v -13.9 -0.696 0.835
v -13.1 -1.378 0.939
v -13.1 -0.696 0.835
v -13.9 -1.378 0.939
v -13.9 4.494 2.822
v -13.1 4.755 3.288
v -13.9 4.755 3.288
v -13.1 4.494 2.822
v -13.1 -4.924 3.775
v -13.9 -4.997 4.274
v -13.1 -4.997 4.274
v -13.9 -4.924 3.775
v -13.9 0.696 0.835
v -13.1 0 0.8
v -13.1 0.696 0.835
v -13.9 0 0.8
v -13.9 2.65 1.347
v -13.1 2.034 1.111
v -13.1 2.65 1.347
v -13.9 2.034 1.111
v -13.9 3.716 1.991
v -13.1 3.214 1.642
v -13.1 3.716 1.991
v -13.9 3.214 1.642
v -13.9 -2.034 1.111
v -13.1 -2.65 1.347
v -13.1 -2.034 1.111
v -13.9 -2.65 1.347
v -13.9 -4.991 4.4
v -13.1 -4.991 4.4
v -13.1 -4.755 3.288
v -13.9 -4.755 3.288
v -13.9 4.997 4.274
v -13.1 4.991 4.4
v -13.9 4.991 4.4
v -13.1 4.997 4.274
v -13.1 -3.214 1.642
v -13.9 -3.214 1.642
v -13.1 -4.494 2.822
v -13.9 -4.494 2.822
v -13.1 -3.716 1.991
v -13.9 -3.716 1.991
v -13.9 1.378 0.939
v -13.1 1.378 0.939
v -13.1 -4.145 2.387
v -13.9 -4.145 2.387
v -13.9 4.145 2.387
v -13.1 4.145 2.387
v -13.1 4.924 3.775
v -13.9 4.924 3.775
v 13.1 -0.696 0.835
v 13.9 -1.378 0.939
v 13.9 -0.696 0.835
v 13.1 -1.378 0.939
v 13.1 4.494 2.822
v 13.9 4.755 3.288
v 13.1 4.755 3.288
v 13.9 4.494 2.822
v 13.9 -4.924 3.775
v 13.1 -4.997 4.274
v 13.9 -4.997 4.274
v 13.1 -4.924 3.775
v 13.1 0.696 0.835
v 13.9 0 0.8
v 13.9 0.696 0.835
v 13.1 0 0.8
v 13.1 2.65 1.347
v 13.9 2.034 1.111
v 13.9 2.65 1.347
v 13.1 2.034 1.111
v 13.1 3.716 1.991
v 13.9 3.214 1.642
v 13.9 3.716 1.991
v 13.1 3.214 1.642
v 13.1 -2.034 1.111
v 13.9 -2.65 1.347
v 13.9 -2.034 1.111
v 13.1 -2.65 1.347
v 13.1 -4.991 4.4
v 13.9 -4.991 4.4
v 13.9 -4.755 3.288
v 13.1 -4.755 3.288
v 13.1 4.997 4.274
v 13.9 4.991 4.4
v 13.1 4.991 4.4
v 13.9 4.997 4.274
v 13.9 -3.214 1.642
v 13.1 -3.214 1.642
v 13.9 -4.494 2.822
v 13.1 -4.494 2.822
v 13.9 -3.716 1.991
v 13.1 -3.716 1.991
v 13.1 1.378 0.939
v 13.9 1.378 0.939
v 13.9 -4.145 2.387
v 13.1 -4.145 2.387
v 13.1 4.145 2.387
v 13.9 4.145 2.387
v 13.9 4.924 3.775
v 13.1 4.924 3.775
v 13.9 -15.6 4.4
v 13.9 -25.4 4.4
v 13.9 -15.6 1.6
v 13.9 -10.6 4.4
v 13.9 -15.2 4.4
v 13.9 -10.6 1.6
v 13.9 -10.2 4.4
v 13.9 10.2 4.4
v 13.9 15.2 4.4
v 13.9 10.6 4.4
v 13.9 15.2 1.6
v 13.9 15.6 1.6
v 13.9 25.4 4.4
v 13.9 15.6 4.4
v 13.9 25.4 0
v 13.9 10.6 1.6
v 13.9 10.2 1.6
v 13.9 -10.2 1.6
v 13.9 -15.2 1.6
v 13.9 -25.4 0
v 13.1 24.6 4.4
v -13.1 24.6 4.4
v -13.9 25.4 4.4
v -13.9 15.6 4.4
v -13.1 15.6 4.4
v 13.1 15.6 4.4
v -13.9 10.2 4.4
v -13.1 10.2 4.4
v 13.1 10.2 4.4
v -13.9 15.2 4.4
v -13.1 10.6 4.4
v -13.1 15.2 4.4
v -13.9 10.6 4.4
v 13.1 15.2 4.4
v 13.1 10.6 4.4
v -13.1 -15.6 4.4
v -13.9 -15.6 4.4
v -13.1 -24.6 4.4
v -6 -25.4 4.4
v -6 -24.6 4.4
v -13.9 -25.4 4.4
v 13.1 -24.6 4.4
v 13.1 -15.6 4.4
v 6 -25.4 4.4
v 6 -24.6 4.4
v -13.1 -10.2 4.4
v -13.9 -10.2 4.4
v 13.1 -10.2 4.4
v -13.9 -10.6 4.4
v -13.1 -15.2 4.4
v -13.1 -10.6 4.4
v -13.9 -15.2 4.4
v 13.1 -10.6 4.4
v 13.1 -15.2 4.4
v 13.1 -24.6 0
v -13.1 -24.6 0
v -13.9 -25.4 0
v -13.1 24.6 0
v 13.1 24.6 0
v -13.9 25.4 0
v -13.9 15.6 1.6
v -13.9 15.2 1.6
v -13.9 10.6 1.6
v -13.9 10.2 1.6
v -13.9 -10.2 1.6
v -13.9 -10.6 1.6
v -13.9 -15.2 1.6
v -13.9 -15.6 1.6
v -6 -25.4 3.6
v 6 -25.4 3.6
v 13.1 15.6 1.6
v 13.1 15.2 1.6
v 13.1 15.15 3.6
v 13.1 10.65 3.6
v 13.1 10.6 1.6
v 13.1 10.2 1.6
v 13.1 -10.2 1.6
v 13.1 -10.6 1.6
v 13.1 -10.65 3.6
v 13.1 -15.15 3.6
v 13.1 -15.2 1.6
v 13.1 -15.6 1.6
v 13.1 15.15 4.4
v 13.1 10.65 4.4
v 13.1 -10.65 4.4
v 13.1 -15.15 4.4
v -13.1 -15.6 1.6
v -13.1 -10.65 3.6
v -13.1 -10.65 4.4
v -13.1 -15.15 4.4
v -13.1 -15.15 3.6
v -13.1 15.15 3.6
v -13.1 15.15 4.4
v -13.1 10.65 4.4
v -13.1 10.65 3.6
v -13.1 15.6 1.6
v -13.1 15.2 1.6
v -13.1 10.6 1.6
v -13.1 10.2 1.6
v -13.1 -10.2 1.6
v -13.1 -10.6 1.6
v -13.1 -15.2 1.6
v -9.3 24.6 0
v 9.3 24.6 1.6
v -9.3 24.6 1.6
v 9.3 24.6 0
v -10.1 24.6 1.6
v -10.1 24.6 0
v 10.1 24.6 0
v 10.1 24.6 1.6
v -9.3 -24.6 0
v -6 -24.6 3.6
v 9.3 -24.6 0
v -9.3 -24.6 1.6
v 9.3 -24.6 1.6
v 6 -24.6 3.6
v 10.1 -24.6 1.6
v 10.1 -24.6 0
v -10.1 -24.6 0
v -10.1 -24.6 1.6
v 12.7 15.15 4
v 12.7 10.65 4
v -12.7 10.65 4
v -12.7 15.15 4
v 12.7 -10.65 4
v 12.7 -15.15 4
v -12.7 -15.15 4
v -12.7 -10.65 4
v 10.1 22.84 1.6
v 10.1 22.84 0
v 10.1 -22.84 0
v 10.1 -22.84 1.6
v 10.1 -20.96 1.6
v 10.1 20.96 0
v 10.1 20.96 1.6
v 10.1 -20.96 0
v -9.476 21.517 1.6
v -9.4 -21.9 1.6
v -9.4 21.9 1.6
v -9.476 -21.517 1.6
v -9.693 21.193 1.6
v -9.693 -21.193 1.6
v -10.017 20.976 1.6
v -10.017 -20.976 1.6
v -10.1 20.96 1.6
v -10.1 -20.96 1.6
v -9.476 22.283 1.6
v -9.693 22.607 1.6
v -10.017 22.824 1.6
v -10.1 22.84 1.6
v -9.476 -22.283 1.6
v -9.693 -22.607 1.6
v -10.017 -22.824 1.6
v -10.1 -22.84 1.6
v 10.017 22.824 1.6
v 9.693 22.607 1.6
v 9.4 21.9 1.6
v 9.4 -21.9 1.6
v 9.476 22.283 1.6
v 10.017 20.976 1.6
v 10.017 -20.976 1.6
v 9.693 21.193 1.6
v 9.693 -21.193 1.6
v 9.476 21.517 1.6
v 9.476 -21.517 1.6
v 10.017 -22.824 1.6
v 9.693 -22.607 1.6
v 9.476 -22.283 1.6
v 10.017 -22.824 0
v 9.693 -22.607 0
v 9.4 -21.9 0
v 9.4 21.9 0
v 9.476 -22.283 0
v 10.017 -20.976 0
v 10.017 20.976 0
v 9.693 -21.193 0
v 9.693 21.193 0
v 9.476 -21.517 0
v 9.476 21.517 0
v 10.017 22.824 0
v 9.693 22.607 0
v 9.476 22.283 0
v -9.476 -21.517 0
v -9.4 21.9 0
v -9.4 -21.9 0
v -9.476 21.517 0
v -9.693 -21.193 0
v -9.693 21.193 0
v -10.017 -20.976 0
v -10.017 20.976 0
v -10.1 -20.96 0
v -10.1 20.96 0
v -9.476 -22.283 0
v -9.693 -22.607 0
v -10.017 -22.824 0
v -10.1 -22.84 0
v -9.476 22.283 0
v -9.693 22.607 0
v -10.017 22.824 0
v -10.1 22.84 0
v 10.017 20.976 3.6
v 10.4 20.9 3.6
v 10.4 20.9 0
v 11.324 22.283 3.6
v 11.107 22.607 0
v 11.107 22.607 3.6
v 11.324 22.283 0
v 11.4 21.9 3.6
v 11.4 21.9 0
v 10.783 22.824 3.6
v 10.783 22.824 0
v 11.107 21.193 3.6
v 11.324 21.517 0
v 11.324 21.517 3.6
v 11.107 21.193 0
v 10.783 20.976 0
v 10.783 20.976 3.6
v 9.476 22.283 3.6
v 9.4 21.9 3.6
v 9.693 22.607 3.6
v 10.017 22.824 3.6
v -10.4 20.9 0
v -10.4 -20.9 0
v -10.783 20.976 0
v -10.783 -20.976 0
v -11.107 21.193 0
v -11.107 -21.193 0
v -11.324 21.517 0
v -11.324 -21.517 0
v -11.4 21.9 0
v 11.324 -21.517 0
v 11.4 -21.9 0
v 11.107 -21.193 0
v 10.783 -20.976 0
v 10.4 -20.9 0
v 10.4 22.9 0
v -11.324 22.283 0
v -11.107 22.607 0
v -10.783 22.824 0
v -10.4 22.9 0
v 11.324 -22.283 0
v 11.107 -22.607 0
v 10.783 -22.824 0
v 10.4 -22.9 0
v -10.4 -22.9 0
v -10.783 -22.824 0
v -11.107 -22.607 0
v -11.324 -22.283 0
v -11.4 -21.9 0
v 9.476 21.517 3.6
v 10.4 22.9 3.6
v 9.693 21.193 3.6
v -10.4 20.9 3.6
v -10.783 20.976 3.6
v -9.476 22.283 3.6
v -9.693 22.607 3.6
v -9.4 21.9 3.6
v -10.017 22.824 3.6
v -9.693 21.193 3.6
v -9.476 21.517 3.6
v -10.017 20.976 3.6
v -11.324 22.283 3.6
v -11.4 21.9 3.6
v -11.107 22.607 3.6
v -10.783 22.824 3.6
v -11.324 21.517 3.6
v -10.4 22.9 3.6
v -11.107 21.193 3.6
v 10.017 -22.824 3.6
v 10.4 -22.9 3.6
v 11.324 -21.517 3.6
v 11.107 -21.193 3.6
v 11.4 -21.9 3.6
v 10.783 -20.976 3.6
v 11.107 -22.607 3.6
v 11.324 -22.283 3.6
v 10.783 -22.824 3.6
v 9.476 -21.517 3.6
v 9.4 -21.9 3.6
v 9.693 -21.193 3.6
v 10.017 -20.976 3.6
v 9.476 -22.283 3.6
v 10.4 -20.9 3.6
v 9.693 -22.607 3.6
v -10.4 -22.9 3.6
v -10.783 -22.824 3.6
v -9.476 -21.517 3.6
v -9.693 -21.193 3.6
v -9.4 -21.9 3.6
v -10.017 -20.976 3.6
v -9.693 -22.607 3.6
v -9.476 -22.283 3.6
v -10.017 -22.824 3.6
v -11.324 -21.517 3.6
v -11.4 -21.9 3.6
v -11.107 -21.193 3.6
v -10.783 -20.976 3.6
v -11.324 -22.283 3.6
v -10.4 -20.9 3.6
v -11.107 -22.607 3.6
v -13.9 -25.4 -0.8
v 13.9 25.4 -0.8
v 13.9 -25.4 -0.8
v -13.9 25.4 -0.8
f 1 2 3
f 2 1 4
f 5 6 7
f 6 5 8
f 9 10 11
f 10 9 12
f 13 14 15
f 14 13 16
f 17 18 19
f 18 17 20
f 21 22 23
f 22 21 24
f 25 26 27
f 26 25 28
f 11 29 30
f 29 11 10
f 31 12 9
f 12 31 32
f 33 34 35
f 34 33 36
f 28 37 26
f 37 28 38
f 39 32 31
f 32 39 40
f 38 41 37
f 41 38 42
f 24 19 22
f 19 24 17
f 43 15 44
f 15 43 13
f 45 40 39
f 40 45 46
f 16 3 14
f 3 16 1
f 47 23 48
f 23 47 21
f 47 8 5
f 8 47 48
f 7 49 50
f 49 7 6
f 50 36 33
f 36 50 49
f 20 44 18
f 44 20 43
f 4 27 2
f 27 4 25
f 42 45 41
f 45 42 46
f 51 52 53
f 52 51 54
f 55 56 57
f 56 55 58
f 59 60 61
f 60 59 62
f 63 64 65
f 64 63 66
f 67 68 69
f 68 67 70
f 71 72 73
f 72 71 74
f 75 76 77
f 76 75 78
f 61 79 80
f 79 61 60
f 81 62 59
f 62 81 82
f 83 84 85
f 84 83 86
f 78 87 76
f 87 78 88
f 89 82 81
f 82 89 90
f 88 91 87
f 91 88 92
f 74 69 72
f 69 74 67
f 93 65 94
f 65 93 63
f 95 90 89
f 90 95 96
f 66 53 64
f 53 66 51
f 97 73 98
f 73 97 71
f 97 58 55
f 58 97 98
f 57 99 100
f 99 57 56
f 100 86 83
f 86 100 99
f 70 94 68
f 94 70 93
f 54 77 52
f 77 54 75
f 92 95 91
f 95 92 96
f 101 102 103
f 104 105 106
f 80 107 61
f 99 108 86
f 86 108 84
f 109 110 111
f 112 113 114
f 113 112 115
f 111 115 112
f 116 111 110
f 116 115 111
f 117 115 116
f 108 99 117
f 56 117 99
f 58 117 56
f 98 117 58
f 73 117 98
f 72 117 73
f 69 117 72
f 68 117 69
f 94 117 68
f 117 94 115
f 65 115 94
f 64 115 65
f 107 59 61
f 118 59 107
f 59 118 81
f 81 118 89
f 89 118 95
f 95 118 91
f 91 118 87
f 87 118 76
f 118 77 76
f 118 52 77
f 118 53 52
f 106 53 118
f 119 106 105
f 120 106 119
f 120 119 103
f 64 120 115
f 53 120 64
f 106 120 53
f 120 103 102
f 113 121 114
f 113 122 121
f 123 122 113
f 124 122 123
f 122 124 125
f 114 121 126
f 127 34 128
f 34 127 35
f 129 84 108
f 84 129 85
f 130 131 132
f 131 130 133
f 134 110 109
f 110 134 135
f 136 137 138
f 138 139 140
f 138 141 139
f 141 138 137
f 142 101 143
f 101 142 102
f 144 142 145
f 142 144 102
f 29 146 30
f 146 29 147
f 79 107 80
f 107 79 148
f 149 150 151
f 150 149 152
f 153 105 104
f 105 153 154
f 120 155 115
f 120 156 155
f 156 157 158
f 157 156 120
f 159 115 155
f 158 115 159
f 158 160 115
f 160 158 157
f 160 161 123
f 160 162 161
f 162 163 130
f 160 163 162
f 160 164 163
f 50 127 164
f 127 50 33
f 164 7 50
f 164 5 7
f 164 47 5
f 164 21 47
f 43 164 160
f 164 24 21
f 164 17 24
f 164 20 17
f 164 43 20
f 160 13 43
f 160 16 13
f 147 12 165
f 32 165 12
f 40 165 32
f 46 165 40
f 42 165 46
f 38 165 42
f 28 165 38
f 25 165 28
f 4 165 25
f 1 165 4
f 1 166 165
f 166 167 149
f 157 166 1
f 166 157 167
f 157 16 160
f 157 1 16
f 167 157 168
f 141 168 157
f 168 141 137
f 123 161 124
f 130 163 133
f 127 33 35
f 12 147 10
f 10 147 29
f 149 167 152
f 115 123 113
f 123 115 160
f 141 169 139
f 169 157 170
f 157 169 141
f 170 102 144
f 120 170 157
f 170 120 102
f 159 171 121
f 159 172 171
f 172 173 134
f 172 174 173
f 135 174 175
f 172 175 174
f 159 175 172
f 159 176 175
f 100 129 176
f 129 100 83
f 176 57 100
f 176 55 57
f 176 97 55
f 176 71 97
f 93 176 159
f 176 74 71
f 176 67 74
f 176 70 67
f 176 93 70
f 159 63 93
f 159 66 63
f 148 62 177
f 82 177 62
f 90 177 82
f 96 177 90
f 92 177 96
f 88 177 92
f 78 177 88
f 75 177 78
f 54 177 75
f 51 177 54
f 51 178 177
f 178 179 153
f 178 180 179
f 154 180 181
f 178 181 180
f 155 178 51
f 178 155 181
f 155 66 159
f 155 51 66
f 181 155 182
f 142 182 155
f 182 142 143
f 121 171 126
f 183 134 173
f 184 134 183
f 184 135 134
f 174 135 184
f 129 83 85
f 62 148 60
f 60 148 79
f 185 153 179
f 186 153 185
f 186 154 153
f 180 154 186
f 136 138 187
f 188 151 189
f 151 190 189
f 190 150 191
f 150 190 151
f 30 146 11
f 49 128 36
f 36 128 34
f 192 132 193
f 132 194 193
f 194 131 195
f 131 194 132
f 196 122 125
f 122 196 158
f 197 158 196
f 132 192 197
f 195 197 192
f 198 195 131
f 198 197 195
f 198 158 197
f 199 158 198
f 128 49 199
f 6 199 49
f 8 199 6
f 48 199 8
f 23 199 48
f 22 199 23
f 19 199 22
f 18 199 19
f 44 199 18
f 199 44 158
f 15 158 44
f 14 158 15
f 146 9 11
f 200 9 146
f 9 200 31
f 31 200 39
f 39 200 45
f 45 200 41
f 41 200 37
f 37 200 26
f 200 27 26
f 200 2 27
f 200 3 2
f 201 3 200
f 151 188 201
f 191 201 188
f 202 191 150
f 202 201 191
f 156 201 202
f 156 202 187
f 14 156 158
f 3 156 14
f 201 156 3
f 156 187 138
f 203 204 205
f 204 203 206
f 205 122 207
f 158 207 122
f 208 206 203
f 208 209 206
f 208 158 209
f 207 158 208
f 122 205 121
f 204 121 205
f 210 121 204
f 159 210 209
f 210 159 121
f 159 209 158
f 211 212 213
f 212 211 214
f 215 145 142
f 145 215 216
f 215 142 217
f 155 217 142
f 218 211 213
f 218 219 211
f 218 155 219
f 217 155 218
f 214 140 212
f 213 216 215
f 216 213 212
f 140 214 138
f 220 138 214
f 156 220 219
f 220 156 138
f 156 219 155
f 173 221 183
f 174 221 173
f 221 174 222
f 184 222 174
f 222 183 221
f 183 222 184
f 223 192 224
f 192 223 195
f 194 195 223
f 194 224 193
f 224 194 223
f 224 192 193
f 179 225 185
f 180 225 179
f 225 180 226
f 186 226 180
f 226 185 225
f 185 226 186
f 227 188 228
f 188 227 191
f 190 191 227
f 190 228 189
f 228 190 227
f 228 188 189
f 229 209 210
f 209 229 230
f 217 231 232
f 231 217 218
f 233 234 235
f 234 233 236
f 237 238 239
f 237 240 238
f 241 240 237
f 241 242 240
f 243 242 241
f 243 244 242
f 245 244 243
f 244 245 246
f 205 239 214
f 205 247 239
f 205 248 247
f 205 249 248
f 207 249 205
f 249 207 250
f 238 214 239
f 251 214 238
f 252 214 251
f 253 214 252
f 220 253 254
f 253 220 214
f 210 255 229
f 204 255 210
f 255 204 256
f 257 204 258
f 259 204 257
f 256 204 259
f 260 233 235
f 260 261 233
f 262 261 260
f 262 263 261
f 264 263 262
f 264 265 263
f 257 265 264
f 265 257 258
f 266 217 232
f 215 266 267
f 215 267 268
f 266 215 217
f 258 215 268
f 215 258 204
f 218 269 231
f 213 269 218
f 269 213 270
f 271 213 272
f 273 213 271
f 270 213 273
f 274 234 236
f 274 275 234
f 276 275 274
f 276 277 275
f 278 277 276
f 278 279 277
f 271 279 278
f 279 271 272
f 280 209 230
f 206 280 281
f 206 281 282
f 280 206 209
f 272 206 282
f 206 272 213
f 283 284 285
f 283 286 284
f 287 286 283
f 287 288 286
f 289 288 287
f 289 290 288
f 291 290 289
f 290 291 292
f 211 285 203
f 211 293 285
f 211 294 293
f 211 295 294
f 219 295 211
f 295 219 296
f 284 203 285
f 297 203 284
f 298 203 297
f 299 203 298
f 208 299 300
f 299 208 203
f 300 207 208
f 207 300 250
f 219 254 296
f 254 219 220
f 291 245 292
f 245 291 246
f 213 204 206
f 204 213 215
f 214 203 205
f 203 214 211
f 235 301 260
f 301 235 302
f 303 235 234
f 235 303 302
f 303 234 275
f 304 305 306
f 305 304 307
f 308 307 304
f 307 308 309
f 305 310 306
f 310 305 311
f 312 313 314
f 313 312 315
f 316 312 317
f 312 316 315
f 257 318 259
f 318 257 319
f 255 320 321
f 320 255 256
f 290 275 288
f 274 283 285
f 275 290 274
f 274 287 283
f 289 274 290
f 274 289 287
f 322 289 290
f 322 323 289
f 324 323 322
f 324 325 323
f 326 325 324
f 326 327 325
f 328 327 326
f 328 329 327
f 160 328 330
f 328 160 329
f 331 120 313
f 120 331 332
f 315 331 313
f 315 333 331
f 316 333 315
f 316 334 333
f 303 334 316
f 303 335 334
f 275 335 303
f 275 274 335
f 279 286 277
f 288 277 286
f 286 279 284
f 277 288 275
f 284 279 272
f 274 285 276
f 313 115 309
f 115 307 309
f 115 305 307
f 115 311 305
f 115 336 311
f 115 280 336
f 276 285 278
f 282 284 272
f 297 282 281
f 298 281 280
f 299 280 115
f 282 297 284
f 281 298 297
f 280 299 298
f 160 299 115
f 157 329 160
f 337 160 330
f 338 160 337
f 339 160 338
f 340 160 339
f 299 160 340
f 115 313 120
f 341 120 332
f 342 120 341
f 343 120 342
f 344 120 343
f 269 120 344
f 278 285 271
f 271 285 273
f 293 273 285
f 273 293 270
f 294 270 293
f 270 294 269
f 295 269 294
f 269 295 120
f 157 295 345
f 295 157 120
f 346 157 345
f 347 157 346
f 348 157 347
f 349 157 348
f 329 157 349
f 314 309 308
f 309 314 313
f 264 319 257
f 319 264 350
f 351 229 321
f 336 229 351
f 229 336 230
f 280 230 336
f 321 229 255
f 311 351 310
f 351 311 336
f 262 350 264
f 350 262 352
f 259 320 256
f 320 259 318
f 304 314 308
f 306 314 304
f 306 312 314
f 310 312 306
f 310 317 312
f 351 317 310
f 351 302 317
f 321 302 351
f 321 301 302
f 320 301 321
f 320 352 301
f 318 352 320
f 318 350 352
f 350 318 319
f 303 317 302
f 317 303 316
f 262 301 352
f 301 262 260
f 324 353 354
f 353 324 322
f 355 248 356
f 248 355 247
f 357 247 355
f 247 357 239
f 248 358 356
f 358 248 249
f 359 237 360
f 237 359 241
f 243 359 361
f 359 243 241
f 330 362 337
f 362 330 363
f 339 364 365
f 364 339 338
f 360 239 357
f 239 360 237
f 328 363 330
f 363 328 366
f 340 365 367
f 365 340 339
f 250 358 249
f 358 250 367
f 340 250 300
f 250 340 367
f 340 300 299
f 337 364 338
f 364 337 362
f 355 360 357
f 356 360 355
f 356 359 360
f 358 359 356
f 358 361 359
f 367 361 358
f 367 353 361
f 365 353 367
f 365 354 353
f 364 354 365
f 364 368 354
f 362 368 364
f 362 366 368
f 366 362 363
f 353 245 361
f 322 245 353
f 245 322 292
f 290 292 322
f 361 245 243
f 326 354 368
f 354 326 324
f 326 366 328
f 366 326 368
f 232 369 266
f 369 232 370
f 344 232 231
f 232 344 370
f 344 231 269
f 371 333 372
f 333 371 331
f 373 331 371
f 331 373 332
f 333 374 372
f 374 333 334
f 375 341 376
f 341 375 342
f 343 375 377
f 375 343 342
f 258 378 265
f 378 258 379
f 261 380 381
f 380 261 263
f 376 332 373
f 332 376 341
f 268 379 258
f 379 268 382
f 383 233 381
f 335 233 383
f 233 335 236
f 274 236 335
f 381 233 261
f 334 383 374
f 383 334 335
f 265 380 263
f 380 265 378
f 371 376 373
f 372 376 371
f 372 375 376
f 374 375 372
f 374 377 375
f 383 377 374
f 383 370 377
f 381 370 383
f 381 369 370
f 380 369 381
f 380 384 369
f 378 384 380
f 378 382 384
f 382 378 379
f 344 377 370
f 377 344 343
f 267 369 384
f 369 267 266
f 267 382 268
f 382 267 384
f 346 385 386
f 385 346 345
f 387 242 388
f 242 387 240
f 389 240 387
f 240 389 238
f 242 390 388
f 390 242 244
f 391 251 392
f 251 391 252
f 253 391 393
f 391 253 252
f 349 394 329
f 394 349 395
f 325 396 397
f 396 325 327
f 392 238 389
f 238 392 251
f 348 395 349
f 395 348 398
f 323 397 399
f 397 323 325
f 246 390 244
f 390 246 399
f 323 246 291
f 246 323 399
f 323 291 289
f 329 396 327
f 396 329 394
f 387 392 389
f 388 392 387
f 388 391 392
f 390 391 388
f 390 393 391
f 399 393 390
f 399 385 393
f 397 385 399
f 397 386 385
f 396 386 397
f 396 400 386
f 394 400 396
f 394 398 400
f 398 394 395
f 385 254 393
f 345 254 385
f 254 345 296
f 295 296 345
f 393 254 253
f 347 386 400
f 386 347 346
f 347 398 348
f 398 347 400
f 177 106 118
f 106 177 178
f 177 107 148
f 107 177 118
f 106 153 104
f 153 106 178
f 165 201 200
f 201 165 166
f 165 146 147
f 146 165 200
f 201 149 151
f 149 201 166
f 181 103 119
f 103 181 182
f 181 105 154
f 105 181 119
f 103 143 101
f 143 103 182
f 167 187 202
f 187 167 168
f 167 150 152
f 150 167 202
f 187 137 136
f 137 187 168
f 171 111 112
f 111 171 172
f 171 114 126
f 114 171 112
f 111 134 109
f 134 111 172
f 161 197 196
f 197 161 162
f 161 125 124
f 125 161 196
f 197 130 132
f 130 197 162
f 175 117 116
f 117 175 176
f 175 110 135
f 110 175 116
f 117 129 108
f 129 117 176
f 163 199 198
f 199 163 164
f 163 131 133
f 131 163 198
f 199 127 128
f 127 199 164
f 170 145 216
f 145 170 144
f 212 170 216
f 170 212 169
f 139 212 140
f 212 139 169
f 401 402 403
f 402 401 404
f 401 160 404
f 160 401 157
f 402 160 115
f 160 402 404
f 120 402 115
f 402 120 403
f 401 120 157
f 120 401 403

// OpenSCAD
////////////////////////////////////////////////////////////////////////////////
// pcb.scad
////////////////////////////////////////////////////////////////////////////////

// customizer

// PCB type (for the 'Generic' type set the values in the 'Generic PCB' section below)
type    = "NodeMcu2" ; // [28BYJ,ArduinoProMiniWithConnector,BuckConv_1V25_5V_3A,Esp01Breakout,Esp32C5DevKitChina,Ftdi,GpsWithAntenna,Lcd1602,LonganNano,My74595,MyPower,NodeMcu2,SdCard,Si4703,Ssd1306,Tja1050,TouchButton,UbloxNeo6Mblue,UbloxNeo6Mred,Uln2003,Ws2812,Generic]

/* [Add Screw to base (mm)] */

// Add screw to base
screwEnable = false ;
// Screw outer diameter
screwOuter = 5 ; // [2:0.1:10]
// Screw inner diameter
screwInner = 3 ; // [2:0.1:8]
// Screw height
screwHeight = 4 ; // [0:0.1:8]
// Screw offset from pcb edge
screwOffsetX = 1 ; // [0:0.1:10]
// Screw offset from center
screwOffsetY = 0 ; // [-15:0.1:15]

/* [Settings for Generic PCB (mm)] */

// Length of the PCB
length  = 35   ; // [10:0.1:60]
// Width of the PCB
width   = 20   ; // [10:0.1:60]
// Height of the PCB
height  =  1.5 ; // [0.6:0.1:2]

// Thickness of the walls
wallWidth = 0.8 ; // [0.4:0.1:2]

// Space between PCB and base
railHeight = 2.0 ; // [1:0.1:8]
// Space between rails and PCB edge
railOffset = 4.0 ; // [0:0.1:10]

// Add clip
clipEnable = true ;
// Distance of the clip from the PCB edge
clipOffset = 5 ; // [0:0.1:30]
// Length of the clip
clipLength =  5 ; // [4:0.1:10]

// Finger hole present
fingerHoleEnable = true ; // [0:1:1]

/* [Hidden] */

module PcbCustomizer(type, length, width, height, wallWidth, railHeight, railOffset,
                     clipEnable, clipOffset, clipLength, fingerHoleEnable,
                     screwEnable, screwOuter, screwInner, screwHeight, screwOffsetX, screwOffsetY) ;
{
  screw = screwEnable ? [ screwOuter, screwInner, screwHeight, screwOffsetX, screwOffsetY ] : undef ;
  
  if      (type == "28BYJ"                      ) { Pcb28BYJ(true, screw) ;                       }
  else if (type == "ArduinoProMiniWithConnector") { PcbArduinoProMiniWithConnector(true, screw) ; }
  else if (type == "BuckConv_1V25_5V_3A"        ) { PcbBuckConv_1V25_5V_3A(true, screw) ;         }
  else if (type == "Esp01Breakout"              ) { PcbEsp01Breakout(true, screw) ;               }
  else if (type == "Esp32C5DevKitChina"         ) { PcbEsp32C5DevKitChina(true, screw) ;          }
  else if (type == "Ftdi"                       ) { PcbFtdi(true, screw) ;                        }
  else if (type == "GpsWithAntenna"             ) { PcbGpsWithAntenna(true, screw) ;              }
  else if (type == "Lcd1602"                    ) { PcbLcd1602(true, screw) ;                     }
  else if (type == "LonganNano"                 ) { PcbLonganNano(true, screw) ;                  }
  else if (type == "My74595"                    ) { PcbMy74595(true, screw) ;                     }
  else if (type == "MyPower"                    ) { PcbMyPower(true, screw) ;                     }
  else if (type == "NodeMcu2"                   ) { PcbNodeMcu2(true, screw) ;                    }
  else if (type == "SdCard"                     ) { PcbSdCard(true, screw) ;                      }
  else if (type == "Si4703"                     ) { PcbSi4703(true, screw) ;                      }
  else if (type == "Ssd1306"                    ) { PcbSsd1306(true, screw) ;                     }
  else if (type == "Tja1050"                    ) { PcbTja1050(true, screw) ;                     }
  else if (type == "TouchButton"                ) { PcbTouchButton(true, screw) ;                 }
  else if (type == "UbloxNeo6Mblue"             ) { PcbUbloxNeo6Mblue(true, screw) ;              }
  else if (type == "UbloxNeo6Mred"              ) { PcbUbloxNeo6Mred(true, screw) ;               }
  else if (type == "Uln2003"                    ) { PcbUln2003(true, screw) ;                     }
  else if (type == "Ws2812"                     ) { PcbWs2812(true, screw) ;                      }
  else // Generic
  {
    clip  = clipEnable  ? [ clipOffset, clipLength ] : undef ;

    PcbHolder(length, width, height, wallWidth, railHeight, railOffset,
              clip=clip, fingerHoleEnable=fingerHoleEnable, baseEnable=true, screw=screw) ;
  }   
}   

PcbCustomizer(type, length, width, height, wallWidth, railHeight, railOffset,
              clipEnable, clipOffset, clipLength, fingerHoleEnable,
              screwEnable, screwOuter, screwInner, screwHeight, screwOffsetX, screwOffsetY) ;

////////////////////////////////////////////////////////////////////////////////

// Length: Y
// Width : X
// Height: Z


// pcbLength: pcb length
// pcbWidth:  pcb width
// pcbHeight: pcb height

// wallWidth:  wall width
// railHeight: rail height where pcb will rest
// railOffset: gap between pcb side and rail

// pins: array of (offsetX, offsetY, radius) entries
// cuts: array of (centerOffsetX, centerOffsetY, width, length, optionalOffsetH) // offsetH == top of pcb
// clip: array of (offset clip starts from end of holder, length of clip)
// baseEnable:   add a base plane
// screw:      add screw holes to the base: vector [ outer diameter, inner diameter, height, x-offset from pcb, optional y-offset ]

module PcbClip(clipLength, wallWidth, clipRight)
{
  mirror([clipRight, 0, 0])
  rotate([90, 0, 0])
  linear_extrude(height=clipLength-wallWidth/2-0.1, center=true)
  polygon(points=[ [ 0, 0], [ wallWidth, 0], [ wallWidth, wallWidth], [ 0, wallWidth ], [ -wallWidth/2, wallWidth/2] ]) ;
}

////////////////////////////////////////////////////////////////////////////////

module PcbHolder(pcbLength, pcbWidth, pcbHeight, wallWidth, railHeight, railOffset,
                 pins=undef, cuts=undef, clip=undef, fingerHoleEnable=false,
                 baseEnable=false, screw=undef)
{
  module screw(lr, d, screwOuter, screwOffsetX, screwOffsetY)
  {
    offset = pcbWidth/2 + wallWidth + screwOuter/2 + screwOffsetX ;

    translate([lr*offset, lr*screwOffsetY])
      circle(d=d) ;
  }

  module base(screwOuter)
  {
    hull()
    {
      square([pcbWidth+2*wallWidth, pcbLength+2*wallWidth], center=true) ;
      screw(-1, screwOuter) ;
      screw(+1, screwOuter) ;
    }
  }

  $fa =  5 ;
  $fs =  0.4 ;
  
  frameLength = pcbLength + 2*wallWidth ;
  frameWidth  = pcbWidth  + 2*wallWidth ;
  frameHeight = railHeight + pcbHeight + wallWidth ;

  clip1 = clip ? frameLength/2 - clip[0] : 0 ;
  clip2 = clip ? clip1 - clip[1] : 0 ;

  difference()
  {
    union()
    {
      translate([0, 0, frameHeight/2])
        difference()
      {
        cube([frameWidth, frameLength, frameHeight  ], center=true) ;
        cube([pcbWidth  , pcbLength  , frameHeight+1], center=true) ;

        // finger hole
        if (fingerHoleEnable)
        {
          for (x = [-(pcbWidth+wallWidth)/2, (pcbWidth+wallWidth)/2])
            translate([x, 0, frameHeight/2])
              rotate([0, 90, 0])
              scale([4*wallWidth + 2*pcbHeight,10,1])
              cylinder(h = 2*wallWidth, d=1, center=true, $fn=45) ;
        }
      }

      if (clip != undef)
      {
        translate([+frameWidth/2-wallWidth, +clip1-clip[1]/2, frameHeight-wallWidth]) PcbClip(clip[1], wallWidth, 0) ;
        translate([-frameWidth/2+wallWidth, +clip1-clip[1]/2, frameHeight-wallWidth]) PcbClip(clip[1], wallWidth, 1) ;
        translate([+frameWidth/2-wallWidth, -clip1+clip[1]/2, frameHeight-wallWidth]) PcbClip(clip[1], wallWidth, 0) ;
        translate([-frameWidth/2+wallWidth, -clip1+clip[1]/2, frameHeight-wallWidth]) PcbClip(clip[1], wallWidth, 1) ;
      }

      translate([0, 0, railHeight/2])
      {
        difference()
        {
          cube([pcbWidth-2*railOffset            , pcbLength,   railHeight  ], center=true) ;
          cube([pcbWidth-2*railOffset-2*wallWidth, pcbLength+1, railHeight+1], center=true) ;
        }    
      }

      if (pins != undef)
      {
        for (pin = pins)
        {
          translate([pin[1], pin[0], 0])
            cylinder(r = pin[2], h=railHeight + pcbHeight) ;
        }
      }
    }

    if (clip != undef)
    {
      for (c = [-clip2, -clip1, clip1, clip2 ])
      {
        translate([+frameWidth/2-wallWidth/2, c, railHeight + (pcbHeight+wallWidth+1)/2]) cube([2*wallWidth, wallWidth/2, pcbHeight+wallWidth+1], center=true) ;
        translate([-frameWidth/2+wallWidth/2, c, railHeight + (pcbHeight+wallWidth+1)/2]) cube([2*wallWidth, wallWidth/2, pcbHeight+wallWidth+1], center=true) ;
      }
    }

    if (cuts != undef)
    {
     for (cut = cuts)
      {
        offsetH = (cut[4] != undef) ? cut[4] : 0;
        translate([cut[1], cut[0], railHeight + pcbHeight + (wallWidth+0.1-offsetH)/2 + offsetH])
          cube([cut[3], cut[2], wallWidth+0.1-offsetH], center=true) ;
      }
    }
      
  }

  if (baseEnable)
  {
    useScrew = (screw != undef) && (4 <= len(screw)) && (len(screw) <= 5) ; 
    screwOuter   = useScrew ? screw[0] : 0 ;
    screwInner   = useScrew ? screw[1] : 0 ;
    screwHeight  = useScrew ? screw[2] : 0 ;
    screwOffsetX = useScrew ? screw[3] : 0 ;
    screwOffsetY = (useScrew && len(screw) == 5) ? screw[4] : 0 ;
    
    difference()
    {
      union()
      {
        translate([0, 0, -wallWidth])
        linear_extrude(height=wallWidth)
        {
          if (useScrew)
          {
         
            hull()
            {
              square([pcbWidth+2*wallWidth, pcbLength+2*wallWidth], center=true) ;
              screw(-1, screwOuter, screwOuter, screwOffsetX, screwOffsetY) ;
              screw(+1, screwOuter, screwOuter, screwOffsetX, screwOffsetY) ;
            }
          }
          else
          {
            square([frameWidth, frameLength], center=true) ;
          }
        }
        if (useScrew)
        {
          translate([0, 0, -wallWidth])
          linear_extrude(height=screwHeight)
          {
            screw(-1, screwOuter, screwOuter, screwOffsetX, screwOffsetY) ;
            screw(+1, screwOuter, screwOuter, screwOffsetX, screwOffsetY) ;
          }
        }
      }

      if (cuts != undef)
      {
        for (cut = cuts)
        {
          offsetH = (cut[4] != undef) ? cut[4] : 0;
          translate([cut[1], cut[0], railHeight + pcbHeight + (wallWidth+0.1-offsetH)/2 + offsetH])
            cube([cut[3], cut[2], wallWidth+0.1-offsetH], center=true) ;
        }
      }
      if (useScrew)
      {
        translate([0, 0, -2*wallWidth])
        linear_extrude(height=screwHeight+3*wallWidth)
        {
          screw(-1, screwInner, screwOuter, screwOffsetX, screwOffsetY) ;
          screw(+1, screwInner, screwOuter, screwOffsetX, screwOffsetY) ;
        }
      }
    }
  }
}

////////////////////////////////////////////////////////////////////////////////

module PcbNodeMcu2(baseEnable = false, screw = undef)
{
  pcbLength  = 49.2 ;
  pcbWidth   = 26.2 ;
  pcbHeight  =  2   ;
  wallWidth  =  0.8 ;
  railHeight =  1.6 ;
  railOffset =  3   ;

  clip = [ 10, 5 ] ;
  
  pinRadius = 1 ;
  pinD = 2.7 ;
  pins =
  [
    [ +pcbLength/2 - pinD, +pcbWidth/2 - pinD, pinRadius ],
    [ +pcbLength/2 - pinD, -pcbWidth/2 + pinD, pinRadius ],
    [ -pcbLength/2 + pinD, +pcbWidth/2 - pinD, pinRadius ],
    [ -pcbLength/2 + pinD, -pcbWidth/2 + pinD, pinRadius ]
  ] ;
  
  cuts =
  [
    [ -pcbLength/2-wallWidth/2, 0, wallWidth+0.01, 12 ]
  ] ;

  PcbHolder(pcbLength, pcbWidth, pcbHeight, wallWidth, railHeight, railOffset,
            clip=clip, pins=pins, cuts=cuts, fingerHoleEnable=true, baseEnable=baseEnable, screw = screw) ;
}

////////////////////////////////////////////////////////////////////////////////

module PcbSsd1306(baseEnable = false)
{
  length = 28.3 ;
  width  = 27.8 ;
  height =  3   ;
  wallWidth = 0.8 ;

  dispLength = 15 ;
  dispWidth  = 26 ;
  dispHeight =  1 ;
  dispOffset =  5 ;

  // frame
  difference()
  {
    translate([0, 0, (height+wallWidth+dispHeight)/2])
    cube([width+wallWidth*2, length+wallWidth*2, height+wallWidth+dispHeight], center=true) ;

    translate([0, 0, height])
    cube([width, length, height*3], center=true) ;

    translate([0, +4+wallWidth/2, height + dispHeight]) cube([2*length, wallWidth, 2*height], center=true) ;
    translate([0, -4-wallWidth/2, height + dispHeight]) cube([2*length, wallWidth, 2*height], center=true) ;
  }

  // clips
  translate([+width/2, 0, height+dispHeight]) PcbClip(8, wallWidth, 0) ;
  translate([-width/2, 0, height+dispHeight]) PcbClip(8, wallWidth, 1) ;

  // display frame
  translate([0, (length-dispLength)/2 - dispOffset, 0])
  difference()
  {
    translate([0, 0, dispHeight/2])
    cube([dispWidth, dispLength, dispHeight], center=true) ;

    translate([0, 0, dispHeight])
    cube([dispWidth - 2*wallWidth, dispLength - 2*wallWidth, dispHeight*3], center=true) ;
  }

  if (baseEnable)
  {
    difference()
    {
      translate([0, 0, -wallWidth/2])
      cube([width+2*wallWidth, length+2*wallWidth, wallWidth], center=true) ;

      translate([0, (length-dispLength)/2 - dispOffset, 0])
      translate([0, 0, dispHeight])
      cube([dispWidth - 2*wallWidth, dispLength - 2*wallWidth, 10], center=true) ;
    }
  }
}

////////////////////////////////////////////////////////////////////////////////

module PcbTouchButton(mode = "pos", baseEnable = false)
{
  length     = 14.8 ; // w/o wall
  width      = 10.5 ; // w/o wall
  height     =  1.3 ; // no wall
  wallWidth  =  0.8 ;
  railHeight =  0.6 ;

  $fn=60;
  
  if (mode == "pos")
  {
    // frame
    difference()
    {
      translate([0, 0, (height+railHeight+wallWidth)/2])
      cube([width+2*wallWidth, length+2*wallWidth, height+railHeight+wallWidth], center=true) ;

      cube([width, length, 3*(height+railHeight+wallWidth)], center=true) ;
    }

    translate([0, +3, railHeight/2]) cube([width, wallWidth, railHeight], center=true) ;
    translate([0, -3, railHeight/2]) cube([width, wallWidth, railHeight], center=true) ;

    translate([+width/2, 0, height + railHeight]) PcbClip(4, wallWidth, 0) ;
    translate([-width/2, 0, height + railHeight]) PcbClip(4, wallWidth, 1) ;

    if (baseEnable)
    {
      translate([0, 0, -wallWidth/2])
      cube([width+2*wallWidth, length+2*wallWidth, wallWidth], center=true) ;
    }
  }
  else if (mode == "neg")
  {
    dy = (length-width)/2 ;
    difference()
    {
      translate([0, dy, -wallWidth]) cylinder(h=2*wallWidth, d=width, center=true) ;    
      translate([0, dy, -wallWidth]) cylinder(h=3*wallWidth, d=width - 2*wallWidth, center=true) ;
    }
  }
}

////////////////////////////////////////////////////////////////////////////////

module PcbMyPower(baseEnable = false, screw = undef)
{
  pcbLength  = 33.4 ;
  pcbWidth   = 19.7 ;
  pcbHeight  =  1.5 ;
  wallWidth  =  0.8 ;
  railHeight =  3.0 ;
  railOffset =  6.5 ;

  clip = [ 5, 5 ] ;

  pins =
    [
      [33.5/2-4, -19/2+5, 1.2],
      [-33.5/2+4, +19/2-5, 1.2]
    ] ;
  
  cuts =
    [
      [ pcbLength/2+wallWidth/2, 19/4, wallWidth+0.01, 19/2],
      [ 5, pcbWidth/2-railOffset-wallWidth/2, 10, wallWidth+0.01, -pcbHeight-railHeight ]
    ] ;

  difference()
  {
    PcbHolder(pcbLength, pcbWidth, pcbHeight, wallWidth, railHeight, railOffset,
              pins=pins,
              cuts=cuts,
              clip=clip,
              fingerHoleEnable=true,
              baseEnable=baseEnable,
              screw=screw) ;

    translate([2, 5, 3]) cube([4, 10, 4], center=true) ;
  }
}

////////////////////////////////////////////////////////////////////////////////

module PcbArduinoProMiniWithConnector(baseEnable = false, screw = undef)
{
  pcbLength  = 33.3 ;
  pcbWidth   = 18.5 ;
  pcbHeight  =  1.2 ;
  wallWidth  =  0.8 ;
  railHeight =  3.0 ;
  railOffset =  5.0 ;

  clip = [ 5, 4 ] ;

  cuts =
    [
      [ pcbLength/2+wallWidth/2, 0, wallWidth+0.01, 18, wallWidth ],
      [ +pcbLength/2-2, 0, 4, 10, -pcbHeight-railHeight ],
      [ -pcbLength/2+2, 0, 4, 10, -pcbHeight-railHeight ],
      [ 3-0.5, pcbWidth/2-railOffset-wallWidth/2, 6, wallWidth+0.01, -pcbHeight-railHeight ]
    ] ;
  
  PcbHolder(pcbLength, pcbWidth, pcbHeight, wallWidth, railHeight, railOffset,
            cuts=cuts,
            clip=clip,
            fingerHoleEnable=true,
            baseEnable=baseEnable,
            screw = screw) ;
}

////////////////////////////////////////////////////////////////////////////////

module PcbSi4703(baseEnable = false, screw = undef)
{
  pcbLength  = 22.8 ;
  pcbWidth   = 29.6 ;
  pcbHeight  =  1.9 ;
  wallWidth  =  0.8 ;
  railHeight =  3.0 ;
  railOffset =  5.0 ;

  clip = [ 4,5 ] ;

  cuts =
    [
      [ pcbLength/2+wallWidth/2, 8, 2*wallWidth, 12 ],
      [ 3.5, pcbWidth/2-railOffset-wallWidth/2, 6, 2*wallWidth, -pcbHeight-railHeight ]
    ] ;
  
  PcbHolder(pcbLength, pcbWidth, pcbHeight, wallWidth, railHeight, railOffset,
            cuts=cuts,
            clip=clip,
            baseEnable=baseEnable,
            screw = screw) ;
}

////////////////////////////////////////////////////////////////////////////////

module PcbWs2812(baseEnable = false)
{
  length = 9.4 ;
  width  = 9.4 ;
  height = 1.5 ;
  wallWidth = 0.8 ;

  ledLength = 5.7 ;
  ledWidth  = 5.7 ;
  ledHeight = 1.5 ;

  difference()
  {
    translate([0, 0, (ledHeight + height + wallWidth)/2])
    cube([width + 2*wallWidth, length + 2*wallWidth, ledHeight + height + wallWidth], center = true) ;

    cube([width, length, 3*(ledHeight + height + wallWidth)], center=true) ;
  }

  translate([0, +(length/2-0.25), ledHeight/2]) cube([width, 0.5, ledHeight], center=true) ;
  translate([0, -(length/2-0.25), ledHeight/2]) cube([width, 0.5, ledHeight], center=true) ;

  translate([+width/2, 0, ledHeight + height]) PcbClip(3, wallWidth, 0) ;
  translate([-width/2, 0, ledHeight + height]) PcbClip(3, wallWidth, 1) ;

  if (baseEnable)
  {
    difference()
    {
      translate([0, 0, -wallWidth/2])
      cube([width+2*wallWidth, length+2*wallWidth, wallWidth], center=true) ;

      cube([ledWidth, ledLength, 10], center=true) ;
    }
  }
}

////////////////////////////////////////////////////////////////////////////////

module PcbLcd1602(baseEnable=false, mode="all")
{
  // hole for screw
  lcdHH  =  6.0 ; // height
  lcdHO  =  5.0 ; // outer dia
  lcdHI  =  3.0 ; // inner dia
  lcdHDX = 75.0 ; // delta x
  lcdHDY = 31.0 ; // delta y

  lcdDIOY = 1.1 ; // offset lcd / lcdC
  
  lcdX = max(80.0, lcdHDX + lcdHO) ;
  lcdY = max(36.0, lcdHDY + lcdHO) ;

  lcdW = 0.8 ;
  
  lcdCX = 71.3 + 0.8 ;
  lcdCY = 24.4 + 0.2 ;
  
  $fn=20 ;

  module positive()
  {
    module screw()
    {
      translate([0, 0, lcdHH/2])
      difference()
      {
        cylinder(h = lcdHH, d = lcdHO, center=true) ;
        cylinder(h = 2*lcdHH, d = lcdHI, center=true) ;
      }
    }

    if (baseEnable)
    {
      translate([0, 0, -lcdW/2]) ;
      cube([lcdX, lcdY, lcdW], center=true) ;
    }
    
    translate([-lcdHDX/2, -lcdHDY/2, 0]) screw() ;
    translate([+lcdHDX/2, -lcdHDY/2, 0]) screw() ;
    translate([-lcdHDX/2, +lcdHDY/2, 0]) screw() ;
    translate([+lcdHDX/2, +lcdHDY/2, 0]) screw() ;

    // stabilization bars
    translate([0, -lcdDIOY/2 + lcdCY/2 + lcdW/2 + lcdW, lcdHH/2]) cube([lcdCX-3, lcdW, lcdHH], center=true) ;
    translate([0, -lcdDIOY/2 - lcdCY/2 - lcdW/2 - lcdW, lcdHH/2]) cube([lcdCX-3, lcdW, lcdHH], center=true) ;
  }

  module negative()
  {
    translate([0, -lcdDIOY/2, -lcdW/2])
    cube([lcdCX, lcdCY, 4*lcdW], center=true) ;
  }

  if (mode == "pos")
  {
    positive() ;
  }
  else if (mode == "neg")
  {
    negative() ;
  }
  else
  {
    difference()
    {
      positive() ;
      negative() ;
    }
  }
    
}

////////////////////////////////////////////////////////////////////////////////

module Pcb28BYJ(mode = "pos", baseEnable = false)
{
  $fn = 40 ;
  w = 0.8 ;
  d = 0.4 ;

  if (mode == "pos")
  {
    difference()
    {
      // ring outer
      translate([0, 0, w/2])
      cylinder(h = w, d = 28.8+2*w+2*d, center = true) ;

      // ring inner
      translate([0, 0, w])
      cylinder(h = 2*w, d = 28.8, center = true) ;

      // screw wing
      translate([0, 0, w/2])
      cube([35, 7.8, w], center=true) ;

      // cable box
      translate([0, -14, w/2])
      cube([15, 28, w], center=true) ;
    }
    
    if (baseEnable)
    {
      translate([0, 0, -w/2])
      {
        difference()
        {
          union()
          {
            // base
            cylinder(h = w, d = 28.8+2*w+2*d, center = true) ;

            // screw wing
            translate([-35/2, 0, 0]) cylinder(h = w, d = 7.8 , center=true) ;
            translate([ 35/2, 0, 0]) cylinder(h = w, d = 7.8, center=true) ;
            cube([35, 7.8, w], center=true) ;
          }

          Pcb28BYJ(mode="neg", baseEnable=baseEnable) ;
        }
      }
    }
  }
  else if (mode == "neg")
  {
    {
      // motor
      translate([0, 8, 0]) cylinder(h = 100, d = 9.9, center=true) ;

      // screw
      translate([-35/2, 0, 0]) cylinder(h = 100, d = 4.5, center=true) ;
      translate([ 35/2, 0, 0]) cylinder(h = 100, d = 4.5, center=true) ;
    }
  }
}

////////////////////////////////////////////////////////////////////////////////

module PcbUln2003(baseEnable = false, screw = undef)
{
  pcbLength  = 32.5 ;
  pcbWidth   = 35.2 ;
  pcbHeight  =  1.8 ;
  wallWidth  =  0.8 ;
  railHeight =  3.0 ;
  railOffset =  5.0 ;

  clip = [ 4, 5 ] ;

  px = pcbLength/2 - 2.8 ;
  py = pcbWidth /2 - 2.8 ;
  pd = 1 ;
  pins=[
    [+px,+py,pd],
    [+px,-py,pd],
    [-px,+py,pd],
    [-px,-py,pd]
  ] ;
  
  PcbHolder(pcbLength, pcbWidth, pcbHeight, wallWidth, railHeight, railOffset,
            pins=pins, clip=clip, fingerHoleEnable=true, baseEnable=true, screw=screw) ;
}

////////////////////////////////////////////////////////////////////////////////

module PcbLonganNano(baseEnable = false, screw = undef)
{
  pcbLength  = 46.5 ;
  pcbWidth   = 20.5 ;
  pcbHeight  =  1.9 ;
  wallWidth  =  0.8 ;
  railHeight =  2.0 ;
  railOffset =  3.0 ;

  module MiddlePin(side)
  {
    difference()
    {
      scale([2, 2.4, 1])
      translate([0, 0, (railHeight+pcbHeight)/2]) cylinder(h = railHeight+pcbHeight, d=1, center=true, $fn=20) ;

      translate([side*10, 0, 0]) cube([20,20,20], center=true) ;
    }
  }

  clip = [ 10, 5 ] ;
  
  cuts =
    [
      [ +pcbLength/2+wallWidth/2, 0, wallWidth+0.01, 11, -pcbHeight-railHeight ],
      [ -pcbLength/2, 0, wallWidth*8, 12, -pcbHeight-railHeight-2*wallWidth ],
    ] ;
     

  translate([+pcbWidth/2+0.01, 1.5, 0]) MiddlePin(+1) ;
  translate([-pcbWidth/2-0.01, 1.5, 0]) MiddlePin(-1) ;
  PcbHolder(pcbLength, pcbWidth, pcbHeight, wallWidth, railHeight, railOffset,
            clip=clip, cuts=cuts, baseEnable=baseEnable, screw = screw) ;
}

////////////////////////////////////////////////////////////////////////////////

module PcbMy74595(baseEnable = false, screw=screw)
{
  pcbLength  = 46.2 ;
  pcbWidth   = 24.8 ;
  pcbHeight  =  1.8 ;
  wallWidth  =  0.8 ;
  railHeight =  2.0 ;
  railOffset =  0.0 ;

  clip = [ 10, 5 ] ;

  cuts =
    [
      [ pcbLength/2, 0, wallWidth * 3, 21 ]
    ] ;
  
  PcbHolder(pcbLength, pcbWidth, pcbHeight, wallWidth, railHeight, railOffset,
            clip=clip, cuts=cuts, fingerHoleEnable=true, baseEnable=baseEnable, screw=screw) ;
}

////////////////////////////////////////////////////////////////////////////////

module PcbBuckConv_1V25_5V_3A(showBase=false, screw=undef)
{
  pcbLength  = 30.5 ;
  pcbWidth   = 20.5 ;
  pcbHeight  =  1.5 ;
  wallWidth  =  0.8 ;
  baseHeight =  2   ;
  baseOffset =  5   ;
  pins       =  [ ] ;  
  cuts       =  [ ] ;
  clip       = [ 3, 5 ] ;
  PcbHolder(pcbLength, pcbWidth, pcbHeight, wallWidth, railHeight, railOffset,
            pins, cuts, clip, fingerHoleEnable=true, baseEnable=showBase, screw=screw) ;
}

////////////////////////////////////////////////////////////////////////////////

module PcbFtdi(baseEnable = false, screw = undef)
{
  pcbLength  = 36.5 ;
  pcbWidth   = 18.6 ;
  pcbHeight  =  1.8 ;
  wallWidth  =  0.8 ;
  railHeight =  2.0 ;
  railOffset =  3.6 ;

  clip = [ 5, 5 ] ;

  cuts =
    [
      [ pcbLength/2-2, 0, 4, pcbWidth-railOffset, -pcbHeight-railHeight ]
    ] ;
  
  PcbHolder(pcbLength, pcbWidth, pcbHeight, wallWidth, railHeight, railOffset,
            cuts=cuts, clip=clip, fingerHoleEnable=true, baseEnable=baseEnable, screw=screw) ;
}   

////////////////////////////////////////////////////////////////////////////////

module PcbTja1050(baseEnable = false, screw=undef)
{
  pcbLength  = 22.5 ;
  pcbWidth   = 11.7 ;
  pcbHeight  =  1.8 ;
  wallWidth  =  0.8 ;
  railHeight =  2.0 ;
  railOffset =  3.0 ;

  clip = [ 3, 2.5 ] ;
  
  pins =
    [
      [ pcbLength/2 - 1.5, +pcbWidth/2 - 1.5, 0.6 ],
      [ pcbLength/2 - 1.5, -pcbWidth/2 + 1.5, 0.6 ]
    ] ;
  
  cuts =
    [
      [ pcbLength/2-2, 0, 4, pcbWidth-2*railOffset+0.01, -pcbHeight-railHeight ],
      [-pcbLength/2+2, 0, 4, pcbWidth-2*railOffset+0.01, -pcbHeight-railHeight ]
    ] ;
  
  PcbHolder(pcbLength, pcbWidth, pcbHeight, wallWidth, railHeight, railOffset,
            pins=pins, cuts=cuts, clip=clip, fingerHoleEnable=true, baseEnable=baseEnable, screw=screw) ;
}

////////////////////////////////////////////////////////////////////////////////

module PcbEsp01Breakout(baseEnable = false, screw=undef)
{
  pcbLength  = 19.2 ;
  pcbWidth   = 16.0 ;
  pcbHeight  =  1.8 ;
  wallWidth  =  0.8 ;
  railHeight =  2.0 ;
  railOffset =  3.0 ;
  
  clip = [ 2.5, 2 ] ;

  cuts =
    [
      [ pcbLength/2-2.5, 0, 5, pcbWidth-2*railOffset+0.1, -pcbHeight-railHeight ],
    ] ;
  
  PcbHolder(pcbLength, pcbWidth, pcbHeight, wallWidth, railHeight, railOffset,
            cuts=cuts, clip=clip, fingerHoleEnable=true, baseEnable=baseEnable, screw=screw) ;
}

////////////////////////////////////////////////////////////////////////////////

module PcbUbloxNeo6Mred(baseEnable = false, srew=undef)
{
  pcbLength  = 24.0 + 0.8 ;
  pcbWidth   = 36.2 + 0.8 ;
  pcbHeight  =  1.2 ;
  wallWidth  =  0.8 ;
  railHeight =  2.0 ;
  railOffset =  8.0 ;

  clip = [ 3, 3.5 ] ;
  pins =
    [
      [ +pcbLength/2 - 3.5, +pcbWidth/2 - 3.5, 1.1 ],
      [ -pcbLength/2 + 3.5, +pcbWidth/2 - 3.5, 1.1 ]
    ] ;

  PcbHolder(pcbLength, pcbWidth, pcbHeight, wallWidth, railHeight, railOffset,
            clip=clip, fingerHoleEnable=true, baseEnable=baseEnable, screw=screw) ;
}

////////////////////////////////////////////////////////////////////////////////
module PcbUbloxNeo6Mblue(baseEnable = false, srew=undef)
{
  pcbLength  = 26.6 + 0.8 ;
  pcbWidth   = 35.8 + 0.8 ;
  pcbHeight  =  1.2 ;
  wallWidth  =  0.8 ;
  railHeight =  2.0 ;
  railOffset =  8.0 ;

  clip = [ 3, 3.5 ] ;
  pins =
    [
      [ +pcbLength/2 - 3.5, +pcbWidth/2 - 3.5, 1.1 ],
      [ -pcbLength/2 + 3.5, +pcbWidth/2 - 3.5, 1.1 ]
    ] ;

  PcbHolder(pcbLength, pcbWidth, pcbHeight, wallWidth, railHeight, railOffset,
            clip=clip, fingerHoleEnable=true, baseEnable=baseEnable, screw=screw) ;
}

////////////////////////////////////////////////////////////////////////////////
module PcbEsp32C5DevKitChina(baseEnable = false, srew=undef)
{
  pcbLength  = 47.2 + 0.6 ;
  pcbWidth   = 25.5 + 0.6 ;
  pcbHeight  =  1.6 ;
  wallWidth  =  0.8 ;
  railHeight =  2.5 ;
  railOffset =  5.0 ;

  clip = [ 7.5, 7.5 ] ;

  cuts =
  [
    [ -pcbLength/2,   0, 5, 18.0 ],
    [ pcbLength/2,  7.1, 5,  9.0 ],
    [ pcbLength/2, -7.1, 5,  9.0 ],
  ] ;

  PcbHolder(pcbLength, pcbWidth, pcbHeight, wallWidth, railHeight, railOffset,
            cuts=cuts, clip=clip, fingerHoleEnable=true, baseEnable=baseEnable, screw=screw) ;
}

////////////////////////////////////////////////////////////////////////////////
module PcbGpsWithAntenna(baseEnable = false, srew=undef)
{
  pcbLength  = 38.8 + 0.8 ;
  pcbWidth   = 25.1 + 0.8 ;
  pcbHeight  =  1.6 ;
  wallWidth  =  0.8 ;
  railHeight =  5.0 ;
  railOffset =  -0.15 ;

  clip = [ 1, 3.5 ] ;

  cuts =
  [
    [ -pcbLength/2,   0, 5, 12.6, -pcbHeight-railHeight ],
    [ pcbLength/2,   -2, 5,  9.0, -pcbHeight-2.8 ],
  ] ;

  PcbHolder(pcbLength, pcbWidth, pcbHeight, wallWidth, railHeight, railOffset,
            cuts=cuts, clip=clip, fingerHoleEnable=true, baseEnable=baseEnable, screw=screw) ;
}

////////////////////////////////////////////////////////////////////////////////
module PcbSdCard(baseEnable = false, srew=undef)
{
  pcbLength  = 18.1 + 0.6 ;
  pcbWidth   = 17.9 + 0.8 ;
  pcbHeight  =  1.6 ;
  wallWidth  =  0.8 ;
  railHeight =  2.5 ;
  railOffset =  3.0 ;

  clip = [ 4, 3.5 ] ;

  cuts =
  [
    [ (-pcbLength-wallWidth)/2, 0, wallWidth+0.1, pcbWidth-2 ],
    [ (pcbLength-3)/2, 0, 3, pcbWidth-2*railOffset+0.1, -pcbHeight-railHeight ]
  ] ;

  pins =
  [
    [ pcbLength/2 - 4.1, +pcbWidth/2 - 1.7, 0.8 ],
    [ pcbLength/2 - 4.1, -pcbWidth/2 + 1.7, 0.8 ],
  ] ;

  PcbHolder(pcbLength, pcbWidth, pcbHeight, wallWidth, railHeight, railOffset,
            cuts=cuts, pins=pins, clip=clip, fingerHoleEnable=false, baseEnable=baseEnable, screw=screw) ;
}

////////////////////////////////////////////////////////////////////////////////
// EOF
////////////////////////////////////////////////////////////////////////////////
